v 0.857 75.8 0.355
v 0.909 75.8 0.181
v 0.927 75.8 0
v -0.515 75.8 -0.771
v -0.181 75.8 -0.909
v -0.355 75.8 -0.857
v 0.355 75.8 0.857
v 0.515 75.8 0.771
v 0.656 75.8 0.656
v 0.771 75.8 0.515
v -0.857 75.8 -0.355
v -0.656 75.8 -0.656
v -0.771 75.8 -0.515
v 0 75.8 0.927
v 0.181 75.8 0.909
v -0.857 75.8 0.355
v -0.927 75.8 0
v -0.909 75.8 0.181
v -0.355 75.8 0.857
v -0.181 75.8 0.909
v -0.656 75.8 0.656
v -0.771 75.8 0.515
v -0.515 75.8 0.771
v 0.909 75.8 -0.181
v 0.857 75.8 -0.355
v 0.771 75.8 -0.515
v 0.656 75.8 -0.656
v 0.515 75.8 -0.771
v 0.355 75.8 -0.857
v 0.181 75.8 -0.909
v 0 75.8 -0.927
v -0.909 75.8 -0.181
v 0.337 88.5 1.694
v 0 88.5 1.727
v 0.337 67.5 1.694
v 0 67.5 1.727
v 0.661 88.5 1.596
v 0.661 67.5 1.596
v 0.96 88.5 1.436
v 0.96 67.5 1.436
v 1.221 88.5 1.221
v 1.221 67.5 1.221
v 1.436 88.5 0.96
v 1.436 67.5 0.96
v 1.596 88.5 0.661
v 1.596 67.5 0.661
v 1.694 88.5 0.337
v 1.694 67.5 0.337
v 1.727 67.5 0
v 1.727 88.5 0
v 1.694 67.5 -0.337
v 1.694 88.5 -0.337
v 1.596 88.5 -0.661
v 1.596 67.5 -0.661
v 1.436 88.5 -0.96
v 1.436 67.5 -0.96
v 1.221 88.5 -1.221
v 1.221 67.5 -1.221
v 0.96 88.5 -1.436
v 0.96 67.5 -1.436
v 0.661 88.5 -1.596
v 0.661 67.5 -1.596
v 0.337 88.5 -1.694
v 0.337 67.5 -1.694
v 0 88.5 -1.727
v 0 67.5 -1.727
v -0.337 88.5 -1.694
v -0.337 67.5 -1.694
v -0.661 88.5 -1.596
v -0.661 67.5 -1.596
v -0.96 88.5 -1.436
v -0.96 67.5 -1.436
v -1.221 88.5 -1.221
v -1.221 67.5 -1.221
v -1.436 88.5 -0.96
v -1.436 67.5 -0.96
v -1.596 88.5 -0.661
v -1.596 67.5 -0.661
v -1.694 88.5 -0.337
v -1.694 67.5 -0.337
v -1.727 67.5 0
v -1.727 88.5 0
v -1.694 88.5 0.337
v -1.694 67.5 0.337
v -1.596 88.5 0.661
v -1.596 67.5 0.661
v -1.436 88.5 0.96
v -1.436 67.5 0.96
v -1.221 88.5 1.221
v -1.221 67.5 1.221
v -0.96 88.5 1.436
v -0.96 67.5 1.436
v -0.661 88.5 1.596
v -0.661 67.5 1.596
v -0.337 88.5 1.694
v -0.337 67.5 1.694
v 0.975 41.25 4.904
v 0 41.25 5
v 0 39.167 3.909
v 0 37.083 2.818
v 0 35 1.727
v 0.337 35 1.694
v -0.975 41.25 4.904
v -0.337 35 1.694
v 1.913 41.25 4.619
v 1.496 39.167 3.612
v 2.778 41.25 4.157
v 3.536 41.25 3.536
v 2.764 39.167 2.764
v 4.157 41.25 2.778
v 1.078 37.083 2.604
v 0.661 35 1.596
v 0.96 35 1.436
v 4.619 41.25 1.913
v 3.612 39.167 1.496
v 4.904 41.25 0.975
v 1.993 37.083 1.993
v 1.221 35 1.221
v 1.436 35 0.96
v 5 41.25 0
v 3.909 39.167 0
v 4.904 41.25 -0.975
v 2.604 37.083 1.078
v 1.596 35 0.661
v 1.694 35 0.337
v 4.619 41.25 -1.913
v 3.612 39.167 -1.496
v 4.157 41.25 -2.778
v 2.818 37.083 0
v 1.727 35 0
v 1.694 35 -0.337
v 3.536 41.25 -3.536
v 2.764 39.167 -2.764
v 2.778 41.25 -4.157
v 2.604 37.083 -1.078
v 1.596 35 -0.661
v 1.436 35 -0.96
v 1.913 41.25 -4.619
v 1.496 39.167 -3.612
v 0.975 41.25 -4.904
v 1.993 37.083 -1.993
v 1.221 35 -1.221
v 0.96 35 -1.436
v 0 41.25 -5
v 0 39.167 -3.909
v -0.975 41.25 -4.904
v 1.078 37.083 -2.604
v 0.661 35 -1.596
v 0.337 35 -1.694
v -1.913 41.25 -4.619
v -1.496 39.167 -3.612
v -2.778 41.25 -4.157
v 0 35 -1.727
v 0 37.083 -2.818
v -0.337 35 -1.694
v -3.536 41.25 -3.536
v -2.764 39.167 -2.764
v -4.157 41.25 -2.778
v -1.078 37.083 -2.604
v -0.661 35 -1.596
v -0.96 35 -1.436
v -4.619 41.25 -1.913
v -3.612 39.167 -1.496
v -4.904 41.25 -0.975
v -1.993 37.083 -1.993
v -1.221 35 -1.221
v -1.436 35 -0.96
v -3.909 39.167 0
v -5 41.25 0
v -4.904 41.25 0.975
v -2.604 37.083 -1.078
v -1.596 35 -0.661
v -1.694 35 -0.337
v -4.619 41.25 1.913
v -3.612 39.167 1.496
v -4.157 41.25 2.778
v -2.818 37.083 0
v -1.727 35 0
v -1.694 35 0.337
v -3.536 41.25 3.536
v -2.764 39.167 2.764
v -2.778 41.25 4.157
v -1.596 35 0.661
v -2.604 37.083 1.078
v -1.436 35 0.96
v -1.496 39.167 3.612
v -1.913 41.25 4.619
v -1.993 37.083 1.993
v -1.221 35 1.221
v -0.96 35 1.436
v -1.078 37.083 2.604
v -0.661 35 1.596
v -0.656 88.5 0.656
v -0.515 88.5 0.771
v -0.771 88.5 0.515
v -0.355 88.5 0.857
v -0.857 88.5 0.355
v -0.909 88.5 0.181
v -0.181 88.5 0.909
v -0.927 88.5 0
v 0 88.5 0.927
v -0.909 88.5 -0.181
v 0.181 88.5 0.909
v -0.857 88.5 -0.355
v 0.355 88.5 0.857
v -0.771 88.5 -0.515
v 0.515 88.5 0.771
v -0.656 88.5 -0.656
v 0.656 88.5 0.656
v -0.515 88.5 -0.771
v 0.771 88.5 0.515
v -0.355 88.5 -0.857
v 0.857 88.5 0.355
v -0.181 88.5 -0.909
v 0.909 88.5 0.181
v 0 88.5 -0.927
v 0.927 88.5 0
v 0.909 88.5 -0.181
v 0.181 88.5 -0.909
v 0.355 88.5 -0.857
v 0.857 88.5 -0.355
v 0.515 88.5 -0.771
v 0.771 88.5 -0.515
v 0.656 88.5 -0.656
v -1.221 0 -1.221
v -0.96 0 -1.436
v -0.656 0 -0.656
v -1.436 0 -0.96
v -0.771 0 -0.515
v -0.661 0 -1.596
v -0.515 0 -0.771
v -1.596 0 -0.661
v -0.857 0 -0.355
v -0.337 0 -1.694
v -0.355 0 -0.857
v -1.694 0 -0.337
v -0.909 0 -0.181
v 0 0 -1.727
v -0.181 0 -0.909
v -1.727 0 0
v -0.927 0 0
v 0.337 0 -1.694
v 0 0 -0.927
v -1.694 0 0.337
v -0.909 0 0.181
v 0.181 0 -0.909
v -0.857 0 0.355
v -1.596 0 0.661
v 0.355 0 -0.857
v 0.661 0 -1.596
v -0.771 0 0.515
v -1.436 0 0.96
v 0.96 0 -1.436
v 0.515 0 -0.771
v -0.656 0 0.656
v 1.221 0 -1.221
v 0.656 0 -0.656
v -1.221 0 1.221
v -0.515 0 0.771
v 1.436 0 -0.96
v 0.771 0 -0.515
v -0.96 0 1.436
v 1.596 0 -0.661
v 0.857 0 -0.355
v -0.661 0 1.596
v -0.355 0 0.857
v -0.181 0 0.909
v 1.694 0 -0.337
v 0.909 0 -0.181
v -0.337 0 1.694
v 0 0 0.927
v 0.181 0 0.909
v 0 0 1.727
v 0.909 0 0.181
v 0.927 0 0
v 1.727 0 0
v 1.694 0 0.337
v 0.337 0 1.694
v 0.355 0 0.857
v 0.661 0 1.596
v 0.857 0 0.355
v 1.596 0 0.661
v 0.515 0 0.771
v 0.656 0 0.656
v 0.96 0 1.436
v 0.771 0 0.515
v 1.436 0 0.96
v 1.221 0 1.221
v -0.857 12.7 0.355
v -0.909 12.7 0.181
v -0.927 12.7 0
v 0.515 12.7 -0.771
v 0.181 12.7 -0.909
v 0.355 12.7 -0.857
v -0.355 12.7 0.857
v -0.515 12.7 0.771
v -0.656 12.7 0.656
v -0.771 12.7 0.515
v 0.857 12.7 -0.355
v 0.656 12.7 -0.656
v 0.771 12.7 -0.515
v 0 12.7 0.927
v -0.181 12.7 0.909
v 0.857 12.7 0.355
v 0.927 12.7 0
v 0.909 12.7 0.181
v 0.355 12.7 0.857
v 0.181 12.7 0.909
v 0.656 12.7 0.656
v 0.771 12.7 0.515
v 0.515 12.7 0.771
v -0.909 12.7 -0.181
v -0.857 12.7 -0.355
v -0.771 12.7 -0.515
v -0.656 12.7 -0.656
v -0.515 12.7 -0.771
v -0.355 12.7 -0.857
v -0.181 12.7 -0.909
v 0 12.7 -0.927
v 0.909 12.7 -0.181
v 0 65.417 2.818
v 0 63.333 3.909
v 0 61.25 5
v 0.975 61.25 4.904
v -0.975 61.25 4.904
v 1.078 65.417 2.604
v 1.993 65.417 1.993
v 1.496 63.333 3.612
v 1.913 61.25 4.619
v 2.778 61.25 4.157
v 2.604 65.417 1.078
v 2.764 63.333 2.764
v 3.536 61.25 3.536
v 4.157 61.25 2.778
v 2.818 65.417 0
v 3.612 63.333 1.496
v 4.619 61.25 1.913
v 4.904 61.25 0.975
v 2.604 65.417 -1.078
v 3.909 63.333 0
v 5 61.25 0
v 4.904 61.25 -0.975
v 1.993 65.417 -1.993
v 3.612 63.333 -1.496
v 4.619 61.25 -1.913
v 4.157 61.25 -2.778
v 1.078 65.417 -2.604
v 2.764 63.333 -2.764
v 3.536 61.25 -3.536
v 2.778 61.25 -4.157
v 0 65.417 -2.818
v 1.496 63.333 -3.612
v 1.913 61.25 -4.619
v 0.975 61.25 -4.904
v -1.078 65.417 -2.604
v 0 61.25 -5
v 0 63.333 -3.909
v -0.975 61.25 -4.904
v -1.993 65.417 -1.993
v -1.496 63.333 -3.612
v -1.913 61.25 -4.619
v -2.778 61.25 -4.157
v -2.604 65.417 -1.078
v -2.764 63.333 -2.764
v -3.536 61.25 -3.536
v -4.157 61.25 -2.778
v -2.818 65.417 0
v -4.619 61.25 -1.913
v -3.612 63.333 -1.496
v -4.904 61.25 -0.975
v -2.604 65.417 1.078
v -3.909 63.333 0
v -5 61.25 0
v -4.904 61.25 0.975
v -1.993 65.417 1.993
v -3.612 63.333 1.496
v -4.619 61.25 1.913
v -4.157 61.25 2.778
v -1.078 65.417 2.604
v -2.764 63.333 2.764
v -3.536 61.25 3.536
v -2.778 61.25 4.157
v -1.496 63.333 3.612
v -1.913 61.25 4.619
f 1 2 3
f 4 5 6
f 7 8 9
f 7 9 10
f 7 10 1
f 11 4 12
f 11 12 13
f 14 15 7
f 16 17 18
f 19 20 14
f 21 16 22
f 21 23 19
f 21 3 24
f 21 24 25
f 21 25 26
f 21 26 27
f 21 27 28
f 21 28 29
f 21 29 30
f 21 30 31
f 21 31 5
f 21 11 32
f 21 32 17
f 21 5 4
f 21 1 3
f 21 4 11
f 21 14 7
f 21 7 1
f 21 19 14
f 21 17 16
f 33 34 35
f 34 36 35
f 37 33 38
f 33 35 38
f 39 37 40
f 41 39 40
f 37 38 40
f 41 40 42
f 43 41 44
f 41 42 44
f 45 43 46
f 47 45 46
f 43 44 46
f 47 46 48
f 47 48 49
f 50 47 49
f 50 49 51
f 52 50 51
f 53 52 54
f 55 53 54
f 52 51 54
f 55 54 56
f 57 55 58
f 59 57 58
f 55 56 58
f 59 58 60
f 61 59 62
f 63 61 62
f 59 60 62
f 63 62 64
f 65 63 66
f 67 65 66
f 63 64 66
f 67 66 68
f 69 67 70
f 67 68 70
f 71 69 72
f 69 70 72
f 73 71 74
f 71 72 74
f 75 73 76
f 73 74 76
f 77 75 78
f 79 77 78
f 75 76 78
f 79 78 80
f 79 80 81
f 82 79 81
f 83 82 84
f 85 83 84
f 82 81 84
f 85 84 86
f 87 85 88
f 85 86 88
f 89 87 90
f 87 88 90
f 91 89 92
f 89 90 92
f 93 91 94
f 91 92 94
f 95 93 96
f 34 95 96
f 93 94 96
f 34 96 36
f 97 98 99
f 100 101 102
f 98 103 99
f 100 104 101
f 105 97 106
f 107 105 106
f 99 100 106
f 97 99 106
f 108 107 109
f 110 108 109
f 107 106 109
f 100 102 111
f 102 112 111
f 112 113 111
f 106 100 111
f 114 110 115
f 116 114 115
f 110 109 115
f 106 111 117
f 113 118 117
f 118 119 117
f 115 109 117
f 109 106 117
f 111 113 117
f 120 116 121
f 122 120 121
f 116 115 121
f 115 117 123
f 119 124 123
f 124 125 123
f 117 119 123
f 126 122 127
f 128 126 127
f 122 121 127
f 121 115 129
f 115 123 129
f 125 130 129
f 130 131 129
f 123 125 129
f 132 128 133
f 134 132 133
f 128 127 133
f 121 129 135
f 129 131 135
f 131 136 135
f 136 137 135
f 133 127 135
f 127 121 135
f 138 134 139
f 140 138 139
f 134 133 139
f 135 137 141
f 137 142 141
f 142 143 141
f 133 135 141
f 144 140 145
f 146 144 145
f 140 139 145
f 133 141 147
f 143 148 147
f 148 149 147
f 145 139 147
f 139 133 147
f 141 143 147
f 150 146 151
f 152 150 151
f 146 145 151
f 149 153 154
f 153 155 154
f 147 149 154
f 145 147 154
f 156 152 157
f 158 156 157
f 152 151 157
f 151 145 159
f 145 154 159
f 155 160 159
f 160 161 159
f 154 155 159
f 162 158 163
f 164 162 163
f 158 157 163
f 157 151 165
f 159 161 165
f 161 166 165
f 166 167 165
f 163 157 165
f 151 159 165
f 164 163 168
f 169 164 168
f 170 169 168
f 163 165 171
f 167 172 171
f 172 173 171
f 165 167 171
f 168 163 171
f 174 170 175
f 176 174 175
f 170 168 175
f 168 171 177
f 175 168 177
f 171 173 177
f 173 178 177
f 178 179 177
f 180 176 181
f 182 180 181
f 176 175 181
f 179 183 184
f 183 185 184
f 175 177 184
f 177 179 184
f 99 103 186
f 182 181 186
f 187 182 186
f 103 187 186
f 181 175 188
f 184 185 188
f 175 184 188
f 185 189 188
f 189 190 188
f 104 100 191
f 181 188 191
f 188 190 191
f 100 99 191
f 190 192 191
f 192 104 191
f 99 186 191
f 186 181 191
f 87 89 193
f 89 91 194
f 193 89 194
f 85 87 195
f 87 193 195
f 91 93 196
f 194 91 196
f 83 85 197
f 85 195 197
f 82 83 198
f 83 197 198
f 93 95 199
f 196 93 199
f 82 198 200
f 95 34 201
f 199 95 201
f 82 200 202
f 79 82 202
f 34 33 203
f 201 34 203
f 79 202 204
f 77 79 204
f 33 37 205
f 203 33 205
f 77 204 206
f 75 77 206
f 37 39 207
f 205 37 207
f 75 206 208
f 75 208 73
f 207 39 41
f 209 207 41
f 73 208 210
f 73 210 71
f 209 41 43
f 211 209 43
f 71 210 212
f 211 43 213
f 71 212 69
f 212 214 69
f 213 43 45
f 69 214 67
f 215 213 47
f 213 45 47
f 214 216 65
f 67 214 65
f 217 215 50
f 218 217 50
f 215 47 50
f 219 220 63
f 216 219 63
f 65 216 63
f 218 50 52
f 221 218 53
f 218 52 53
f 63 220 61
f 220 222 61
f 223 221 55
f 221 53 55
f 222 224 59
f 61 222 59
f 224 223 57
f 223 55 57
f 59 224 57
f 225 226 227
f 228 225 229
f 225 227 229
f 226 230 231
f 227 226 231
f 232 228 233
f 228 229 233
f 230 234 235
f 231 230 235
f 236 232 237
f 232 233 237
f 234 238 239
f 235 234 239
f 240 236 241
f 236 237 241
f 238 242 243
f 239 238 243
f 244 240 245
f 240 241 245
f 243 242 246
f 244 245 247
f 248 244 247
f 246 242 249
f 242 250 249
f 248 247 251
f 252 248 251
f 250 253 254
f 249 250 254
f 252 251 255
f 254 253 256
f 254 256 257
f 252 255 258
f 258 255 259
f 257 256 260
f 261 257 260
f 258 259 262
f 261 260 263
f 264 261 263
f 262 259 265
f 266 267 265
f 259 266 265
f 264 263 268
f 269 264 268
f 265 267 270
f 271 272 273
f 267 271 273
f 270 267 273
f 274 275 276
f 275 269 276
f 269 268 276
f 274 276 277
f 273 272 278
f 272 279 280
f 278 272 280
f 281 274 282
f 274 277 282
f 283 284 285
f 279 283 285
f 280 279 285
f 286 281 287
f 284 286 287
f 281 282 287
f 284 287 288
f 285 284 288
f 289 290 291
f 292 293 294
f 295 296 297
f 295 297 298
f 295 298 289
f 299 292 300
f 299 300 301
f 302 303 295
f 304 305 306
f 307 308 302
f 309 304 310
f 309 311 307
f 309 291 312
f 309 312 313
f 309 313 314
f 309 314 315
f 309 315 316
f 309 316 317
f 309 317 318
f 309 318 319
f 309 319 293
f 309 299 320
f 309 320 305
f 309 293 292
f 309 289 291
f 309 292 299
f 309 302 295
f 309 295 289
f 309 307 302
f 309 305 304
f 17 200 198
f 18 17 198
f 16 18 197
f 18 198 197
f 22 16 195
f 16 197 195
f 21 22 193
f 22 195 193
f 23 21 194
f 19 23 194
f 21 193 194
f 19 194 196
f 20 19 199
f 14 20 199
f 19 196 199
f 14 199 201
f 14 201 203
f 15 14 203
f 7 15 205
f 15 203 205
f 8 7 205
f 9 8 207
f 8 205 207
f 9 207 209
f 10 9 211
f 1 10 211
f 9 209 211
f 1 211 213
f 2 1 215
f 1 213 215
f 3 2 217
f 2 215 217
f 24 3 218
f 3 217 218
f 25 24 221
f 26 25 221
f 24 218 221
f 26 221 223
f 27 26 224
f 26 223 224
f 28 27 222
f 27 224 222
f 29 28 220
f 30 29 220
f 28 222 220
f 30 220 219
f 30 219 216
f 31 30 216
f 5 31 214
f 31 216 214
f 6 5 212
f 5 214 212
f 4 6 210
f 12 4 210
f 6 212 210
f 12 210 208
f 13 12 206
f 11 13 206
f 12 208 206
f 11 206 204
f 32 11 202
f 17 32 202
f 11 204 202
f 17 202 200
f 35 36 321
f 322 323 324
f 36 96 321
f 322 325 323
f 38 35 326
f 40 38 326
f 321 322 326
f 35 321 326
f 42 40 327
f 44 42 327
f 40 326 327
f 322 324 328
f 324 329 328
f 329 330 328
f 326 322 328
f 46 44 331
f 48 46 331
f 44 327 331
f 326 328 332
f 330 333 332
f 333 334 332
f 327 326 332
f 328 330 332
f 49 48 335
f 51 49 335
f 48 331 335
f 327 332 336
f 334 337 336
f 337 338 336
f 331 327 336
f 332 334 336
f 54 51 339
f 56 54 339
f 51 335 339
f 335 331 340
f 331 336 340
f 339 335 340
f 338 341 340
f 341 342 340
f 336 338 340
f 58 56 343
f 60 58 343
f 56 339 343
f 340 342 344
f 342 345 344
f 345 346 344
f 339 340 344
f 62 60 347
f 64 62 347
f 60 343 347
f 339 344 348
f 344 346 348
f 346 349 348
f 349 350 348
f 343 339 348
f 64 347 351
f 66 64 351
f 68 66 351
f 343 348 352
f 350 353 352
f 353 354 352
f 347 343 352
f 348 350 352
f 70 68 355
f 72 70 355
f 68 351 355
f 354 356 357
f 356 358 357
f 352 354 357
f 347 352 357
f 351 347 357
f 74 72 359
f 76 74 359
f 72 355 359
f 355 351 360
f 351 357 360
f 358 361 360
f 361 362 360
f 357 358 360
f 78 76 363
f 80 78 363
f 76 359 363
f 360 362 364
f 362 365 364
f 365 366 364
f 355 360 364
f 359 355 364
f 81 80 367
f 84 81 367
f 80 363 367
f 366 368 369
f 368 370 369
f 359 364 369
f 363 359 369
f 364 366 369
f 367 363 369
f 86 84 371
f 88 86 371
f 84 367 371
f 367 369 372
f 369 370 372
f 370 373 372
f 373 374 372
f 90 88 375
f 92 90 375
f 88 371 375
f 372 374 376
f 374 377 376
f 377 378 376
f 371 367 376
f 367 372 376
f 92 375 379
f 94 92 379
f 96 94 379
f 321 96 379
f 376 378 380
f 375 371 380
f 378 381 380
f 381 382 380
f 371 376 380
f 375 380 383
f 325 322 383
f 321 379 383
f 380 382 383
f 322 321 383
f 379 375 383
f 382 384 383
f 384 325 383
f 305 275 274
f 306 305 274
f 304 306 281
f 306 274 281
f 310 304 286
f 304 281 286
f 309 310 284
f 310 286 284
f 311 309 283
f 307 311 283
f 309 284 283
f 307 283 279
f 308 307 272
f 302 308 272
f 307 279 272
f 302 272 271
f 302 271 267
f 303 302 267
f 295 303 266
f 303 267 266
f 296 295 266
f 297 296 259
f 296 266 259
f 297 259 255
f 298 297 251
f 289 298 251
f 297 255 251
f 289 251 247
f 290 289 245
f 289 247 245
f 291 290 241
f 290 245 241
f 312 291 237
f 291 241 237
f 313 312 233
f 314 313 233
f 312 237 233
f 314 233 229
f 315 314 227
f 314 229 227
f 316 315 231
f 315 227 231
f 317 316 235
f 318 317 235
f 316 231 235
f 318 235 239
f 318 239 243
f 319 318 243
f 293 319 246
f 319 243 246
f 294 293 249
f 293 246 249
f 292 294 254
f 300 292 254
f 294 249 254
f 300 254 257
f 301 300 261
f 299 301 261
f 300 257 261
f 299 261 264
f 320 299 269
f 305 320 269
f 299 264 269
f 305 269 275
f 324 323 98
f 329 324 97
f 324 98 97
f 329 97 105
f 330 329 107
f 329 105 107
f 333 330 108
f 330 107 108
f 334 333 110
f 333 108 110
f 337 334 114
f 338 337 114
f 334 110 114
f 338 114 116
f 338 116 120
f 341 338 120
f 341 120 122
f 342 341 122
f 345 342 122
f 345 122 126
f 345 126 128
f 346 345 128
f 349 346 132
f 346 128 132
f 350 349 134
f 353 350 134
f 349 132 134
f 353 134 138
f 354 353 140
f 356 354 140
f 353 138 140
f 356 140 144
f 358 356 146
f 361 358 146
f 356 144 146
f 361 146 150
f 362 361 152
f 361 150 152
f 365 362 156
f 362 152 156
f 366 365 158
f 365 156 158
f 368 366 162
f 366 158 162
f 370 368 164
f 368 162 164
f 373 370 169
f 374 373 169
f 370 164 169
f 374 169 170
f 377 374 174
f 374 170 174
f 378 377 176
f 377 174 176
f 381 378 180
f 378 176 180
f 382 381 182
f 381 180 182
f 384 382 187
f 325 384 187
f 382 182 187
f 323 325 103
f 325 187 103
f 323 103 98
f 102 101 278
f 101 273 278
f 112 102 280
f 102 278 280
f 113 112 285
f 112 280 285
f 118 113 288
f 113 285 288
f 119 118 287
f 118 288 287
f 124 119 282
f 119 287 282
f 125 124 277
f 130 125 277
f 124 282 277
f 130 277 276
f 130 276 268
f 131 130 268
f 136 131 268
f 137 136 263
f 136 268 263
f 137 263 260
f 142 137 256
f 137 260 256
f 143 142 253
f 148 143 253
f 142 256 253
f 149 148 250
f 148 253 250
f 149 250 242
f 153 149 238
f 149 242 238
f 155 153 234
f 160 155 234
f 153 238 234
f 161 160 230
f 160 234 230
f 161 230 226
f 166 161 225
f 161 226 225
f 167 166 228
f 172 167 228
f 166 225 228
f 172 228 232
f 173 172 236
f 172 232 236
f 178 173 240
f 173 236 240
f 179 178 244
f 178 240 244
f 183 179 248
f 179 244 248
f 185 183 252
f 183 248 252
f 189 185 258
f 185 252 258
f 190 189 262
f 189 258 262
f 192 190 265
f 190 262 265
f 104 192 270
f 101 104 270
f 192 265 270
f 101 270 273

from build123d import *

# Parameters (mm, degrees)
F2_R     = 0.9271
F3_DEPTH = 12.7
F4_R     = 0.9271
F5_DEPTH = 12.7


with BuildPart() as f1:
    # F0 (on Right) → F1 (revolve)
    with BuildSketch(Plane.YZ):
        Polygon((0, 1.7272), (0, 0), (88.5, 0), (88.5, 1.7272), (67.5, 1.7272), (61.25, 5), (41.25, 5), (35, 1.7272), align=None)
    revolve(axis=Axis((0, 44.25, 0), (0, 1, 0)))

    # F2 (on face) → F3 (cut)
    with BuildSketch(Plane(origin=(0, 88.5, 0), x_dir=(-1, 0, 0), z_dir=(0, 1, 0))):
        Circle(F2_R)
    extrude(amount=-F3_DEPTH, mode=Mode.SUBTRACT)

    # F4 (on face) → F5 (cut)
    with BuildSketch(Plane.XZ):
        Circle(F4_R)
    extrude(amount=-F5_DEPTH, mode=Mode.SUBTRACT)


solid = f1.part
